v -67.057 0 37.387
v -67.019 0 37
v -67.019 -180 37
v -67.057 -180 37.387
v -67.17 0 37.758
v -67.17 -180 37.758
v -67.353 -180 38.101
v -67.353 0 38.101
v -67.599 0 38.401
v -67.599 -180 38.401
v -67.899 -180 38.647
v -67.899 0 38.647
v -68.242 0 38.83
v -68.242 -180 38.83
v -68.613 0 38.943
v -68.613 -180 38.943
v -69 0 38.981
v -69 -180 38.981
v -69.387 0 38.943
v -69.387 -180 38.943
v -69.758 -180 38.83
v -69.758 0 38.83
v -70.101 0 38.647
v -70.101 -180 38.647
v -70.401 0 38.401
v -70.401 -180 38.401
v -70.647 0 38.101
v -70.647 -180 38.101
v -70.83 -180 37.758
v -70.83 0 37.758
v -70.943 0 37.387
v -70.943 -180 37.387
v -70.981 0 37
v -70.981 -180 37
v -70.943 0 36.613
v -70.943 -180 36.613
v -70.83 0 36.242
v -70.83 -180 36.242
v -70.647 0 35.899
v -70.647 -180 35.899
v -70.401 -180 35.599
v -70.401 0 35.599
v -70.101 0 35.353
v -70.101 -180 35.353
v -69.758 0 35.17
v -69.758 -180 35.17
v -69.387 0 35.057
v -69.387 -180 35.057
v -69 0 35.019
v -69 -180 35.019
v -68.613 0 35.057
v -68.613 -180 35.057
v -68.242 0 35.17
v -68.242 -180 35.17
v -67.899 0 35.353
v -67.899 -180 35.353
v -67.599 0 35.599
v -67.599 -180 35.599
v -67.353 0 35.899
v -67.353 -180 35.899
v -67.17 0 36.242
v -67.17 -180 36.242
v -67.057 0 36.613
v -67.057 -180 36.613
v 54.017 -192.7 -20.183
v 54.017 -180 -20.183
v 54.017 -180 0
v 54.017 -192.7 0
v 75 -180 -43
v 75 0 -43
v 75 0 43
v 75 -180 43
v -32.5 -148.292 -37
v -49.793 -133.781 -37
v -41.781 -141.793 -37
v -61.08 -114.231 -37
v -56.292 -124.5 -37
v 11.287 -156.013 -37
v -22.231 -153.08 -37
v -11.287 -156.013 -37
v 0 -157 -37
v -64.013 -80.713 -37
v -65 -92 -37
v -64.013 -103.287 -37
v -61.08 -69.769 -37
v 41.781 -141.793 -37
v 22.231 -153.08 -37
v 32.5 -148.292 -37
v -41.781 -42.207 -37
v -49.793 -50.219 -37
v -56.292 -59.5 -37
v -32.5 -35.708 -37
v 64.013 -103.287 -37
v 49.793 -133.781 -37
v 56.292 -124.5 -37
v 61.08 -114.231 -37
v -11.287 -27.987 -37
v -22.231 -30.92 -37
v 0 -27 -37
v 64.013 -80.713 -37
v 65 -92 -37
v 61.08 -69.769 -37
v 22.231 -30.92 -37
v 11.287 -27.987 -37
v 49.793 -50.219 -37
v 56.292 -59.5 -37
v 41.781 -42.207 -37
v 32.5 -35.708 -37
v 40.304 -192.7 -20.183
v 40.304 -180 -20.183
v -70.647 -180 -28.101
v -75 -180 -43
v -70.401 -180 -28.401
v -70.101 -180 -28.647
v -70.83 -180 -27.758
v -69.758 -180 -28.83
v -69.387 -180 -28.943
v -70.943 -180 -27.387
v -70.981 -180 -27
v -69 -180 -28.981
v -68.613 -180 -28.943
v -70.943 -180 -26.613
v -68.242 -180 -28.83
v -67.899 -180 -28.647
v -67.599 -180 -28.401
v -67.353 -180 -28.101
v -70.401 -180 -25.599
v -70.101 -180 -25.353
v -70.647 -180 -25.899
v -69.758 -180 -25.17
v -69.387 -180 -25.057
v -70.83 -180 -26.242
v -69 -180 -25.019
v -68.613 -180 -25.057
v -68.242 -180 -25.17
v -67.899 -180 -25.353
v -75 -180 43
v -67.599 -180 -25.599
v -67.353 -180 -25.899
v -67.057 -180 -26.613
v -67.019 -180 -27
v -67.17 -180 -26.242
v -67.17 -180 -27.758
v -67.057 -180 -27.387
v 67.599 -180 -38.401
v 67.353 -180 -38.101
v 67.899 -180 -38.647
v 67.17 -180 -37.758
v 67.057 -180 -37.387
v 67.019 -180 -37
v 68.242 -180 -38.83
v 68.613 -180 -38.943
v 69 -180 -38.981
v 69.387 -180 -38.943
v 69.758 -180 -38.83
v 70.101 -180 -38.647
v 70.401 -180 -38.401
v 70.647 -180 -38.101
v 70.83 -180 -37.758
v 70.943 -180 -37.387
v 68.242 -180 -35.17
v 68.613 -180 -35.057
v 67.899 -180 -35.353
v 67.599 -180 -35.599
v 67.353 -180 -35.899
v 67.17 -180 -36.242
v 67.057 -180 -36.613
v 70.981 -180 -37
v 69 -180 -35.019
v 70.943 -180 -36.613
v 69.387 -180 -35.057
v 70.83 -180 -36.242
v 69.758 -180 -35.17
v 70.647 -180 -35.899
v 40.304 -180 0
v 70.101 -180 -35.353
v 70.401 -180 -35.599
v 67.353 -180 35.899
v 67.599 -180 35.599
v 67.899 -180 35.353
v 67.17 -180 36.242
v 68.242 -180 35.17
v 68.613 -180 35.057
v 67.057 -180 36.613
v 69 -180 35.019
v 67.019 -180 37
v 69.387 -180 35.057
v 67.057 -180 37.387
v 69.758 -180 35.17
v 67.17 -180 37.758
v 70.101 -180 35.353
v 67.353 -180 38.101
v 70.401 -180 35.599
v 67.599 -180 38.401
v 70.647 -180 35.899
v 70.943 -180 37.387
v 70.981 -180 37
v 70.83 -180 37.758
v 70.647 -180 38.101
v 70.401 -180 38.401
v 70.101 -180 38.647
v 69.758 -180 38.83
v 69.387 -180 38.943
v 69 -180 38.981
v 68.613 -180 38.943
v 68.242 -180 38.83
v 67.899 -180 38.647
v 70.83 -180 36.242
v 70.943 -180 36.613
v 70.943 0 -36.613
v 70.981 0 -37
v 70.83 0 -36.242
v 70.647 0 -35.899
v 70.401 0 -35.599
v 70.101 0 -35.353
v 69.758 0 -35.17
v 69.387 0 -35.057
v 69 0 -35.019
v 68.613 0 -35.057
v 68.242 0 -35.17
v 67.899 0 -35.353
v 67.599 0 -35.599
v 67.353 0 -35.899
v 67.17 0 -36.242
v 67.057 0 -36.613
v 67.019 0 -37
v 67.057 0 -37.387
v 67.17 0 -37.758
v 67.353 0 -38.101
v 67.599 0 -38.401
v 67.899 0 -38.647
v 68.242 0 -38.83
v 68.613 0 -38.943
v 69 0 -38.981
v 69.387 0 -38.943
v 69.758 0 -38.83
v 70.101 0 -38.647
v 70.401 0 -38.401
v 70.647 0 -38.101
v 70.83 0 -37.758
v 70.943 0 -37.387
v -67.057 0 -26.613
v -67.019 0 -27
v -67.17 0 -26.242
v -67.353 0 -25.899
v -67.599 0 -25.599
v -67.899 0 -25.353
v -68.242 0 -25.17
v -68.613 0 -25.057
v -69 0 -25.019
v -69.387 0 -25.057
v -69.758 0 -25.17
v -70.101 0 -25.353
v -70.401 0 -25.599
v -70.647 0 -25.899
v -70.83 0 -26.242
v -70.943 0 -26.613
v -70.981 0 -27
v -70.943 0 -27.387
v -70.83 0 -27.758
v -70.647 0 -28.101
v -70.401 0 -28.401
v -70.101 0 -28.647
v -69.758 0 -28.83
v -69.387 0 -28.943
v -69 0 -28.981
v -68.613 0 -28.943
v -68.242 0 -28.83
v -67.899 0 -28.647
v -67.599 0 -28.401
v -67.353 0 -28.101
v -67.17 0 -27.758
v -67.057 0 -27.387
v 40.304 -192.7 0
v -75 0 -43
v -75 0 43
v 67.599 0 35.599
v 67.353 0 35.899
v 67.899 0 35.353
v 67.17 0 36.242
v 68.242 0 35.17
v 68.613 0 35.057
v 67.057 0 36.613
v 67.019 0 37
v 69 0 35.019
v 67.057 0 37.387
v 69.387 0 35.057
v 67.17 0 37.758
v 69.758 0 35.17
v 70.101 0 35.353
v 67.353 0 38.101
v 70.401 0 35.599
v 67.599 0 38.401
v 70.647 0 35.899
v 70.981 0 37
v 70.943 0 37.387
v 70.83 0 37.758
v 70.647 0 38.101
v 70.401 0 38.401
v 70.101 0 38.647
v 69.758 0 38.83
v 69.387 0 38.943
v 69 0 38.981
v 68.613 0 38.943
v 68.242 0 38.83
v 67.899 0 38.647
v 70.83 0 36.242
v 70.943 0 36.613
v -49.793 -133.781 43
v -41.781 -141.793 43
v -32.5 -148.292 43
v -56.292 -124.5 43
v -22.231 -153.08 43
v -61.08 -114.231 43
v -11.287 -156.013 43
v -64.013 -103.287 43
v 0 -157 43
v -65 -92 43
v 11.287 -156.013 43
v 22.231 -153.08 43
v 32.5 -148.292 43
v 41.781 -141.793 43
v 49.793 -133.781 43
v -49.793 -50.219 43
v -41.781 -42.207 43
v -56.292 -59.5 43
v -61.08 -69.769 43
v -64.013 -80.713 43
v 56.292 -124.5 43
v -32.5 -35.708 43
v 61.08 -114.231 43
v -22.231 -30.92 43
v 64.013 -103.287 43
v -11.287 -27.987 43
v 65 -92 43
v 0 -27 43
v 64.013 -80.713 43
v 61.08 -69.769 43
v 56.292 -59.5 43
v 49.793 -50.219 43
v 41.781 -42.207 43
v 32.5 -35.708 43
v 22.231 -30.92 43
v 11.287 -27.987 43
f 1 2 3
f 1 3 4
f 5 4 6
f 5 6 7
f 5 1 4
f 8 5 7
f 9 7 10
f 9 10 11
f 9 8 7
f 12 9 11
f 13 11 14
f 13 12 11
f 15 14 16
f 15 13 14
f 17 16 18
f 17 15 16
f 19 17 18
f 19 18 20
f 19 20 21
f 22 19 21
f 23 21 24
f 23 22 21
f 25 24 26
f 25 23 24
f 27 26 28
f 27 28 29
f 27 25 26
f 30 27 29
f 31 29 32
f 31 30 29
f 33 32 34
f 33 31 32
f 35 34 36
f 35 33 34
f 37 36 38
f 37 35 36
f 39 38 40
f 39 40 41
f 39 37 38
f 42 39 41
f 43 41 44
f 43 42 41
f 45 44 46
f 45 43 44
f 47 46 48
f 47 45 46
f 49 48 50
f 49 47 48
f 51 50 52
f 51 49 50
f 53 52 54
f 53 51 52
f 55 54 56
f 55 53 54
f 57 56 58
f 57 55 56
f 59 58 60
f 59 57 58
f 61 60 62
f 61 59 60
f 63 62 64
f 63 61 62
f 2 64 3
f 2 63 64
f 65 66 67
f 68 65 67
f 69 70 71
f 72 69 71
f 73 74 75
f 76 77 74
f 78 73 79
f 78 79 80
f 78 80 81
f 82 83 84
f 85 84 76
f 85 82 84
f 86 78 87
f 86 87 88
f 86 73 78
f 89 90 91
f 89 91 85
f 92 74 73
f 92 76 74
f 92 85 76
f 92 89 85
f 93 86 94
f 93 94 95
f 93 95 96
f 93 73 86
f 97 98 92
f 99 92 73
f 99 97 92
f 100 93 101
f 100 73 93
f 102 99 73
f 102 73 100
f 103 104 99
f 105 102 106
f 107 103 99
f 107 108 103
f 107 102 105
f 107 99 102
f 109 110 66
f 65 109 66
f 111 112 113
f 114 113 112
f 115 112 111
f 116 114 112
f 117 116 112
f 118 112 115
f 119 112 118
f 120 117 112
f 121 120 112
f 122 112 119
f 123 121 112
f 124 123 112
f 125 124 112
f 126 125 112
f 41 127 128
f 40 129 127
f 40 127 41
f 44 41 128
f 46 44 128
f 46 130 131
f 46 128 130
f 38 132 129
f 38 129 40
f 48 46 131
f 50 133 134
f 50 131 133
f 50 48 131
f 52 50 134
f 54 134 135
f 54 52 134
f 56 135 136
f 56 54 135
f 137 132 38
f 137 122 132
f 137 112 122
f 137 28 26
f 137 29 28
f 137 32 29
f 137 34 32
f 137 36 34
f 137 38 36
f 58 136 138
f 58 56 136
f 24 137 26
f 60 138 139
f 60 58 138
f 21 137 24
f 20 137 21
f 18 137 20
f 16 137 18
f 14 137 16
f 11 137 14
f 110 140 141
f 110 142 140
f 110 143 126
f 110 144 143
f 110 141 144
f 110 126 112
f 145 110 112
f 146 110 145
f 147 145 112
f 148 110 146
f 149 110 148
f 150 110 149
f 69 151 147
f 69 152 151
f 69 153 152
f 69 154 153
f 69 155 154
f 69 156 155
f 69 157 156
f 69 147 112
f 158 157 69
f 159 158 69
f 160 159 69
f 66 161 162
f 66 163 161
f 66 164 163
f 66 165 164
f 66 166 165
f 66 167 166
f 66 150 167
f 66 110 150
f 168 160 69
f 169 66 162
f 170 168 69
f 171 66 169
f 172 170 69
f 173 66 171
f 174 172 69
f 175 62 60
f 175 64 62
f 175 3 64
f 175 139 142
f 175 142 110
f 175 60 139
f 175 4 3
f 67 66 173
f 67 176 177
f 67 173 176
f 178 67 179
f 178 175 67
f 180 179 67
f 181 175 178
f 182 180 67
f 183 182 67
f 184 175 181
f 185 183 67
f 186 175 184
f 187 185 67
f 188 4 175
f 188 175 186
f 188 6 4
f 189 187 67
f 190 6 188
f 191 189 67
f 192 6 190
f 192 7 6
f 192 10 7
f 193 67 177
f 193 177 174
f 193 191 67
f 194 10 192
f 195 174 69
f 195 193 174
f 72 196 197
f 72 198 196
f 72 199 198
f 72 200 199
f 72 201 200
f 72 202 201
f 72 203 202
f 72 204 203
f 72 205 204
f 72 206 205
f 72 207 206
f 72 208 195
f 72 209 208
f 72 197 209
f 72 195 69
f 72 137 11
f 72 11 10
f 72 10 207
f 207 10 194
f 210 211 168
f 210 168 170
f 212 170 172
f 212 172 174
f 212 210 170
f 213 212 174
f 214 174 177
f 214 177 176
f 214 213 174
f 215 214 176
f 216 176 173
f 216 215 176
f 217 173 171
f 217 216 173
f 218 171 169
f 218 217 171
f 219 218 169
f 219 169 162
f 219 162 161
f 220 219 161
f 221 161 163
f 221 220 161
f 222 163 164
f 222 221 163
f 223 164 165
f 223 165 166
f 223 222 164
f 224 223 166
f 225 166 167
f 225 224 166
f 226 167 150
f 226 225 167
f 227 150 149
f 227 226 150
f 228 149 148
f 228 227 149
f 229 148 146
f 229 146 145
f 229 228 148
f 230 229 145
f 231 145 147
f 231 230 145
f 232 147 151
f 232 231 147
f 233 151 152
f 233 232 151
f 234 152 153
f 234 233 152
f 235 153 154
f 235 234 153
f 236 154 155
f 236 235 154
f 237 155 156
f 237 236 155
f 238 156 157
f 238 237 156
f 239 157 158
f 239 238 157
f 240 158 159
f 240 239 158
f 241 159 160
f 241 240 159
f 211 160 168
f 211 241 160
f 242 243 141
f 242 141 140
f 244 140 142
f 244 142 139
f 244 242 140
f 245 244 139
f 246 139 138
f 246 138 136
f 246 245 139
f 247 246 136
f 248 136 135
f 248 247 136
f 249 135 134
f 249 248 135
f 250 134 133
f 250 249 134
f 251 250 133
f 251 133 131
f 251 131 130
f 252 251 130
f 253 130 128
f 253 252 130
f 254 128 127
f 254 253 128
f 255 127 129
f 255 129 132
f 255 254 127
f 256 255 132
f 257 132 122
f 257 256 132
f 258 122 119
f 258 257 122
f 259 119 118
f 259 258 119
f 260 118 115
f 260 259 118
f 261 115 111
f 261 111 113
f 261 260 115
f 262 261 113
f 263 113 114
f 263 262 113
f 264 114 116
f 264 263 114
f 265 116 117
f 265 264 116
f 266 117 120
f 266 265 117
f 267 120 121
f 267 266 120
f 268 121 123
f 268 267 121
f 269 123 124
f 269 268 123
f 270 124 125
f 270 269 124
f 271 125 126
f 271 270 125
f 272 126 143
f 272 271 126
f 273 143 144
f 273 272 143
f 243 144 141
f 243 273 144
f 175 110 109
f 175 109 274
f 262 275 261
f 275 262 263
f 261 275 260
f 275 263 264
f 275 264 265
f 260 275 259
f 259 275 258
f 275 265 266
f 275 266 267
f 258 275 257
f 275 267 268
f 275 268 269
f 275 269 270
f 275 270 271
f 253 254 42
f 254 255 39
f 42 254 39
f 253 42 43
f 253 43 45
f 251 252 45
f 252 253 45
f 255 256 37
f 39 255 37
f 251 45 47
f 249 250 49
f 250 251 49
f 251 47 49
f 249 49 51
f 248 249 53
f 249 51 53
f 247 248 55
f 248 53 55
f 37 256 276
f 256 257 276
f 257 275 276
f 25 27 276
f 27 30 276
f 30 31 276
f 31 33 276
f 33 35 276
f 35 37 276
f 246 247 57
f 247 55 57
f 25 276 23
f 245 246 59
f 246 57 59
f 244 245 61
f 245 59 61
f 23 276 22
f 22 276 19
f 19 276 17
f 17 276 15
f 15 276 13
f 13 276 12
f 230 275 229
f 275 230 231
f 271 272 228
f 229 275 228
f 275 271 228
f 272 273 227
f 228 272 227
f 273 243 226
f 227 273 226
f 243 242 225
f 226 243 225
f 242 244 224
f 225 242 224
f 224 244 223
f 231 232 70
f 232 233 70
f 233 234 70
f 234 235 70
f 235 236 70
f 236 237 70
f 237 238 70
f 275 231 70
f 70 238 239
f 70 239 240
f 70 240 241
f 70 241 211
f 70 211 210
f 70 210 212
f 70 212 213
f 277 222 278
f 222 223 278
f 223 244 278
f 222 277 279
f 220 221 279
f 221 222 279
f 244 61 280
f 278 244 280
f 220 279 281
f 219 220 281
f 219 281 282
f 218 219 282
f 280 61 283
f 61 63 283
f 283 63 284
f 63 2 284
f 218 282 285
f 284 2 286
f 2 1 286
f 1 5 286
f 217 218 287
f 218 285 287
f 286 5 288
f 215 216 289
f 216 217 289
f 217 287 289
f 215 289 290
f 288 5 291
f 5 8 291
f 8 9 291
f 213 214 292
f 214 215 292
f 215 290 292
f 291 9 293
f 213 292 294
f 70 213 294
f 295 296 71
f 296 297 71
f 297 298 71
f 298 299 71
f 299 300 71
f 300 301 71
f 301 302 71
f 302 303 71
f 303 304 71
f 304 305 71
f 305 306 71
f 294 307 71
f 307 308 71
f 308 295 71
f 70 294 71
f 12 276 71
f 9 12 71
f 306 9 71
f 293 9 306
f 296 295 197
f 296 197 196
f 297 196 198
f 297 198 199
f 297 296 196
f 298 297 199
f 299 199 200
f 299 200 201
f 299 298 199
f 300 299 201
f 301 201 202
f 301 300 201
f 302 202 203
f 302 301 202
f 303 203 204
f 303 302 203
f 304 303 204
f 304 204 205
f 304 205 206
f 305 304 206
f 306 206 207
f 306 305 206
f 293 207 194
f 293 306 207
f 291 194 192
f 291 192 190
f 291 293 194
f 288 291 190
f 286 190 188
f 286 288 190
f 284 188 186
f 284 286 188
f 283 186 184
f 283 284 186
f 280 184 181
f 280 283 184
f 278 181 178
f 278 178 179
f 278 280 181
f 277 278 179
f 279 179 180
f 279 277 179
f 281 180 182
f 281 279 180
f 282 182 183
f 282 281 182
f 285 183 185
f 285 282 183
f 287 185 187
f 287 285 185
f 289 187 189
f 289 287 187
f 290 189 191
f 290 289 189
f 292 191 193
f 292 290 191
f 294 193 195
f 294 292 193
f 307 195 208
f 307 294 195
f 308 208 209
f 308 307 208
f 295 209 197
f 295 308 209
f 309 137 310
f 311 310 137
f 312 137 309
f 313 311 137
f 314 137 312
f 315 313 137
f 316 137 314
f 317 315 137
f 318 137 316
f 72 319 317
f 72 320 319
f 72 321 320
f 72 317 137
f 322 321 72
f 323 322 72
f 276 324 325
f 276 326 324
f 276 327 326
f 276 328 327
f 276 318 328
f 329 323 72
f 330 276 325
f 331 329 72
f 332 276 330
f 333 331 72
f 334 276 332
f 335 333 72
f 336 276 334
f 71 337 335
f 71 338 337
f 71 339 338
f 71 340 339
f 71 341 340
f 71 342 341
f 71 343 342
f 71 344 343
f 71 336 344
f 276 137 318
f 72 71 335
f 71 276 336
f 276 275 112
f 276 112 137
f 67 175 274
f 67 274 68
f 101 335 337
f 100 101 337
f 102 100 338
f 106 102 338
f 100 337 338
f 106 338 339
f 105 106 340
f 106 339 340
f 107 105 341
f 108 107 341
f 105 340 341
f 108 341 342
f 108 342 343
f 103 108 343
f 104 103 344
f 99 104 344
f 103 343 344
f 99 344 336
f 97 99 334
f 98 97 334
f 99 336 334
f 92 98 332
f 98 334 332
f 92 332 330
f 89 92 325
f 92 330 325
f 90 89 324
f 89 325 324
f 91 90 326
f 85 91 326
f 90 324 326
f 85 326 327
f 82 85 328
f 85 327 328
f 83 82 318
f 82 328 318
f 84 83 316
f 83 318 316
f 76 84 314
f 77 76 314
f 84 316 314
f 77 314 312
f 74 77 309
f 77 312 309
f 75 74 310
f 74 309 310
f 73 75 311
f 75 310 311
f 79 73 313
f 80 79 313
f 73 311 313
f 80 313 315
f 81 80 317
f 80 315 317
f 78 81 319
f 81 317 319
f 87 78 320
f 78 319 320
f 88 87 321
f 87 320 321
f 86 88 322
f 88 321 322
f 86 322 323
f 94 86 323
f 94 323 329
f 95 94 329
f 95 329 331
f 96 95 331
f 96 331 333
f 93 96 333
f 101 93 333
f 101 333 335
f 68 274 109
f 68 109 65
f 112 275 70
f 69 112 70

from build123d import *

# Parameters (mm, degrees)
F0_W     = 150
F0_H     = 86
F0_R     = 1.9812
F1_DEPTH = 180
F2_R     = 65
F3_DEPTH = 80
F4_W     = 13.712838
F4_H     = 20.182729
F5_DEPTH = 12.7


with BuildPart() as f1:
    # F0 (on Front) → F1 (new body)
    with BuildSketch(Plane.XZ):
        Rectangle(F0_W, F0_H)
        with Locations((-69, -27)):
            Circle(F0_R, mode=Mode.SUBTRACT)
        with Locations((69, -37)):
            Circle(F0_R, mode=Mode.SUBTRACT)
        with Locations((-69, 37)):
            Circle(F0_R, mode=Mode.SUBTRACT)
        with Locations((69, 37)):
            Circle(F0_R, mode=Mode.SUBTRACT)
    extrude(amount=F1_DEPTH)

    # F2 (on face) → F3 (cut)
    with BuildSketch(Plane.XY.offset(43)):
        with Locations((0, -92)):
            Circle(F2_R)
    extrude(amount=-F3_DEPTH, mode=Mode.SUBTRACT)

    # F4 (on face) → F5 (join)
    with BuildSketch(Plane.XZ.offset(180)):
        with Locations((47.160495, -10.091364)):
            Rectangle(F4_W, F4_H)
    extrude(amount=F5_DEPTH)


solid = f1.part
